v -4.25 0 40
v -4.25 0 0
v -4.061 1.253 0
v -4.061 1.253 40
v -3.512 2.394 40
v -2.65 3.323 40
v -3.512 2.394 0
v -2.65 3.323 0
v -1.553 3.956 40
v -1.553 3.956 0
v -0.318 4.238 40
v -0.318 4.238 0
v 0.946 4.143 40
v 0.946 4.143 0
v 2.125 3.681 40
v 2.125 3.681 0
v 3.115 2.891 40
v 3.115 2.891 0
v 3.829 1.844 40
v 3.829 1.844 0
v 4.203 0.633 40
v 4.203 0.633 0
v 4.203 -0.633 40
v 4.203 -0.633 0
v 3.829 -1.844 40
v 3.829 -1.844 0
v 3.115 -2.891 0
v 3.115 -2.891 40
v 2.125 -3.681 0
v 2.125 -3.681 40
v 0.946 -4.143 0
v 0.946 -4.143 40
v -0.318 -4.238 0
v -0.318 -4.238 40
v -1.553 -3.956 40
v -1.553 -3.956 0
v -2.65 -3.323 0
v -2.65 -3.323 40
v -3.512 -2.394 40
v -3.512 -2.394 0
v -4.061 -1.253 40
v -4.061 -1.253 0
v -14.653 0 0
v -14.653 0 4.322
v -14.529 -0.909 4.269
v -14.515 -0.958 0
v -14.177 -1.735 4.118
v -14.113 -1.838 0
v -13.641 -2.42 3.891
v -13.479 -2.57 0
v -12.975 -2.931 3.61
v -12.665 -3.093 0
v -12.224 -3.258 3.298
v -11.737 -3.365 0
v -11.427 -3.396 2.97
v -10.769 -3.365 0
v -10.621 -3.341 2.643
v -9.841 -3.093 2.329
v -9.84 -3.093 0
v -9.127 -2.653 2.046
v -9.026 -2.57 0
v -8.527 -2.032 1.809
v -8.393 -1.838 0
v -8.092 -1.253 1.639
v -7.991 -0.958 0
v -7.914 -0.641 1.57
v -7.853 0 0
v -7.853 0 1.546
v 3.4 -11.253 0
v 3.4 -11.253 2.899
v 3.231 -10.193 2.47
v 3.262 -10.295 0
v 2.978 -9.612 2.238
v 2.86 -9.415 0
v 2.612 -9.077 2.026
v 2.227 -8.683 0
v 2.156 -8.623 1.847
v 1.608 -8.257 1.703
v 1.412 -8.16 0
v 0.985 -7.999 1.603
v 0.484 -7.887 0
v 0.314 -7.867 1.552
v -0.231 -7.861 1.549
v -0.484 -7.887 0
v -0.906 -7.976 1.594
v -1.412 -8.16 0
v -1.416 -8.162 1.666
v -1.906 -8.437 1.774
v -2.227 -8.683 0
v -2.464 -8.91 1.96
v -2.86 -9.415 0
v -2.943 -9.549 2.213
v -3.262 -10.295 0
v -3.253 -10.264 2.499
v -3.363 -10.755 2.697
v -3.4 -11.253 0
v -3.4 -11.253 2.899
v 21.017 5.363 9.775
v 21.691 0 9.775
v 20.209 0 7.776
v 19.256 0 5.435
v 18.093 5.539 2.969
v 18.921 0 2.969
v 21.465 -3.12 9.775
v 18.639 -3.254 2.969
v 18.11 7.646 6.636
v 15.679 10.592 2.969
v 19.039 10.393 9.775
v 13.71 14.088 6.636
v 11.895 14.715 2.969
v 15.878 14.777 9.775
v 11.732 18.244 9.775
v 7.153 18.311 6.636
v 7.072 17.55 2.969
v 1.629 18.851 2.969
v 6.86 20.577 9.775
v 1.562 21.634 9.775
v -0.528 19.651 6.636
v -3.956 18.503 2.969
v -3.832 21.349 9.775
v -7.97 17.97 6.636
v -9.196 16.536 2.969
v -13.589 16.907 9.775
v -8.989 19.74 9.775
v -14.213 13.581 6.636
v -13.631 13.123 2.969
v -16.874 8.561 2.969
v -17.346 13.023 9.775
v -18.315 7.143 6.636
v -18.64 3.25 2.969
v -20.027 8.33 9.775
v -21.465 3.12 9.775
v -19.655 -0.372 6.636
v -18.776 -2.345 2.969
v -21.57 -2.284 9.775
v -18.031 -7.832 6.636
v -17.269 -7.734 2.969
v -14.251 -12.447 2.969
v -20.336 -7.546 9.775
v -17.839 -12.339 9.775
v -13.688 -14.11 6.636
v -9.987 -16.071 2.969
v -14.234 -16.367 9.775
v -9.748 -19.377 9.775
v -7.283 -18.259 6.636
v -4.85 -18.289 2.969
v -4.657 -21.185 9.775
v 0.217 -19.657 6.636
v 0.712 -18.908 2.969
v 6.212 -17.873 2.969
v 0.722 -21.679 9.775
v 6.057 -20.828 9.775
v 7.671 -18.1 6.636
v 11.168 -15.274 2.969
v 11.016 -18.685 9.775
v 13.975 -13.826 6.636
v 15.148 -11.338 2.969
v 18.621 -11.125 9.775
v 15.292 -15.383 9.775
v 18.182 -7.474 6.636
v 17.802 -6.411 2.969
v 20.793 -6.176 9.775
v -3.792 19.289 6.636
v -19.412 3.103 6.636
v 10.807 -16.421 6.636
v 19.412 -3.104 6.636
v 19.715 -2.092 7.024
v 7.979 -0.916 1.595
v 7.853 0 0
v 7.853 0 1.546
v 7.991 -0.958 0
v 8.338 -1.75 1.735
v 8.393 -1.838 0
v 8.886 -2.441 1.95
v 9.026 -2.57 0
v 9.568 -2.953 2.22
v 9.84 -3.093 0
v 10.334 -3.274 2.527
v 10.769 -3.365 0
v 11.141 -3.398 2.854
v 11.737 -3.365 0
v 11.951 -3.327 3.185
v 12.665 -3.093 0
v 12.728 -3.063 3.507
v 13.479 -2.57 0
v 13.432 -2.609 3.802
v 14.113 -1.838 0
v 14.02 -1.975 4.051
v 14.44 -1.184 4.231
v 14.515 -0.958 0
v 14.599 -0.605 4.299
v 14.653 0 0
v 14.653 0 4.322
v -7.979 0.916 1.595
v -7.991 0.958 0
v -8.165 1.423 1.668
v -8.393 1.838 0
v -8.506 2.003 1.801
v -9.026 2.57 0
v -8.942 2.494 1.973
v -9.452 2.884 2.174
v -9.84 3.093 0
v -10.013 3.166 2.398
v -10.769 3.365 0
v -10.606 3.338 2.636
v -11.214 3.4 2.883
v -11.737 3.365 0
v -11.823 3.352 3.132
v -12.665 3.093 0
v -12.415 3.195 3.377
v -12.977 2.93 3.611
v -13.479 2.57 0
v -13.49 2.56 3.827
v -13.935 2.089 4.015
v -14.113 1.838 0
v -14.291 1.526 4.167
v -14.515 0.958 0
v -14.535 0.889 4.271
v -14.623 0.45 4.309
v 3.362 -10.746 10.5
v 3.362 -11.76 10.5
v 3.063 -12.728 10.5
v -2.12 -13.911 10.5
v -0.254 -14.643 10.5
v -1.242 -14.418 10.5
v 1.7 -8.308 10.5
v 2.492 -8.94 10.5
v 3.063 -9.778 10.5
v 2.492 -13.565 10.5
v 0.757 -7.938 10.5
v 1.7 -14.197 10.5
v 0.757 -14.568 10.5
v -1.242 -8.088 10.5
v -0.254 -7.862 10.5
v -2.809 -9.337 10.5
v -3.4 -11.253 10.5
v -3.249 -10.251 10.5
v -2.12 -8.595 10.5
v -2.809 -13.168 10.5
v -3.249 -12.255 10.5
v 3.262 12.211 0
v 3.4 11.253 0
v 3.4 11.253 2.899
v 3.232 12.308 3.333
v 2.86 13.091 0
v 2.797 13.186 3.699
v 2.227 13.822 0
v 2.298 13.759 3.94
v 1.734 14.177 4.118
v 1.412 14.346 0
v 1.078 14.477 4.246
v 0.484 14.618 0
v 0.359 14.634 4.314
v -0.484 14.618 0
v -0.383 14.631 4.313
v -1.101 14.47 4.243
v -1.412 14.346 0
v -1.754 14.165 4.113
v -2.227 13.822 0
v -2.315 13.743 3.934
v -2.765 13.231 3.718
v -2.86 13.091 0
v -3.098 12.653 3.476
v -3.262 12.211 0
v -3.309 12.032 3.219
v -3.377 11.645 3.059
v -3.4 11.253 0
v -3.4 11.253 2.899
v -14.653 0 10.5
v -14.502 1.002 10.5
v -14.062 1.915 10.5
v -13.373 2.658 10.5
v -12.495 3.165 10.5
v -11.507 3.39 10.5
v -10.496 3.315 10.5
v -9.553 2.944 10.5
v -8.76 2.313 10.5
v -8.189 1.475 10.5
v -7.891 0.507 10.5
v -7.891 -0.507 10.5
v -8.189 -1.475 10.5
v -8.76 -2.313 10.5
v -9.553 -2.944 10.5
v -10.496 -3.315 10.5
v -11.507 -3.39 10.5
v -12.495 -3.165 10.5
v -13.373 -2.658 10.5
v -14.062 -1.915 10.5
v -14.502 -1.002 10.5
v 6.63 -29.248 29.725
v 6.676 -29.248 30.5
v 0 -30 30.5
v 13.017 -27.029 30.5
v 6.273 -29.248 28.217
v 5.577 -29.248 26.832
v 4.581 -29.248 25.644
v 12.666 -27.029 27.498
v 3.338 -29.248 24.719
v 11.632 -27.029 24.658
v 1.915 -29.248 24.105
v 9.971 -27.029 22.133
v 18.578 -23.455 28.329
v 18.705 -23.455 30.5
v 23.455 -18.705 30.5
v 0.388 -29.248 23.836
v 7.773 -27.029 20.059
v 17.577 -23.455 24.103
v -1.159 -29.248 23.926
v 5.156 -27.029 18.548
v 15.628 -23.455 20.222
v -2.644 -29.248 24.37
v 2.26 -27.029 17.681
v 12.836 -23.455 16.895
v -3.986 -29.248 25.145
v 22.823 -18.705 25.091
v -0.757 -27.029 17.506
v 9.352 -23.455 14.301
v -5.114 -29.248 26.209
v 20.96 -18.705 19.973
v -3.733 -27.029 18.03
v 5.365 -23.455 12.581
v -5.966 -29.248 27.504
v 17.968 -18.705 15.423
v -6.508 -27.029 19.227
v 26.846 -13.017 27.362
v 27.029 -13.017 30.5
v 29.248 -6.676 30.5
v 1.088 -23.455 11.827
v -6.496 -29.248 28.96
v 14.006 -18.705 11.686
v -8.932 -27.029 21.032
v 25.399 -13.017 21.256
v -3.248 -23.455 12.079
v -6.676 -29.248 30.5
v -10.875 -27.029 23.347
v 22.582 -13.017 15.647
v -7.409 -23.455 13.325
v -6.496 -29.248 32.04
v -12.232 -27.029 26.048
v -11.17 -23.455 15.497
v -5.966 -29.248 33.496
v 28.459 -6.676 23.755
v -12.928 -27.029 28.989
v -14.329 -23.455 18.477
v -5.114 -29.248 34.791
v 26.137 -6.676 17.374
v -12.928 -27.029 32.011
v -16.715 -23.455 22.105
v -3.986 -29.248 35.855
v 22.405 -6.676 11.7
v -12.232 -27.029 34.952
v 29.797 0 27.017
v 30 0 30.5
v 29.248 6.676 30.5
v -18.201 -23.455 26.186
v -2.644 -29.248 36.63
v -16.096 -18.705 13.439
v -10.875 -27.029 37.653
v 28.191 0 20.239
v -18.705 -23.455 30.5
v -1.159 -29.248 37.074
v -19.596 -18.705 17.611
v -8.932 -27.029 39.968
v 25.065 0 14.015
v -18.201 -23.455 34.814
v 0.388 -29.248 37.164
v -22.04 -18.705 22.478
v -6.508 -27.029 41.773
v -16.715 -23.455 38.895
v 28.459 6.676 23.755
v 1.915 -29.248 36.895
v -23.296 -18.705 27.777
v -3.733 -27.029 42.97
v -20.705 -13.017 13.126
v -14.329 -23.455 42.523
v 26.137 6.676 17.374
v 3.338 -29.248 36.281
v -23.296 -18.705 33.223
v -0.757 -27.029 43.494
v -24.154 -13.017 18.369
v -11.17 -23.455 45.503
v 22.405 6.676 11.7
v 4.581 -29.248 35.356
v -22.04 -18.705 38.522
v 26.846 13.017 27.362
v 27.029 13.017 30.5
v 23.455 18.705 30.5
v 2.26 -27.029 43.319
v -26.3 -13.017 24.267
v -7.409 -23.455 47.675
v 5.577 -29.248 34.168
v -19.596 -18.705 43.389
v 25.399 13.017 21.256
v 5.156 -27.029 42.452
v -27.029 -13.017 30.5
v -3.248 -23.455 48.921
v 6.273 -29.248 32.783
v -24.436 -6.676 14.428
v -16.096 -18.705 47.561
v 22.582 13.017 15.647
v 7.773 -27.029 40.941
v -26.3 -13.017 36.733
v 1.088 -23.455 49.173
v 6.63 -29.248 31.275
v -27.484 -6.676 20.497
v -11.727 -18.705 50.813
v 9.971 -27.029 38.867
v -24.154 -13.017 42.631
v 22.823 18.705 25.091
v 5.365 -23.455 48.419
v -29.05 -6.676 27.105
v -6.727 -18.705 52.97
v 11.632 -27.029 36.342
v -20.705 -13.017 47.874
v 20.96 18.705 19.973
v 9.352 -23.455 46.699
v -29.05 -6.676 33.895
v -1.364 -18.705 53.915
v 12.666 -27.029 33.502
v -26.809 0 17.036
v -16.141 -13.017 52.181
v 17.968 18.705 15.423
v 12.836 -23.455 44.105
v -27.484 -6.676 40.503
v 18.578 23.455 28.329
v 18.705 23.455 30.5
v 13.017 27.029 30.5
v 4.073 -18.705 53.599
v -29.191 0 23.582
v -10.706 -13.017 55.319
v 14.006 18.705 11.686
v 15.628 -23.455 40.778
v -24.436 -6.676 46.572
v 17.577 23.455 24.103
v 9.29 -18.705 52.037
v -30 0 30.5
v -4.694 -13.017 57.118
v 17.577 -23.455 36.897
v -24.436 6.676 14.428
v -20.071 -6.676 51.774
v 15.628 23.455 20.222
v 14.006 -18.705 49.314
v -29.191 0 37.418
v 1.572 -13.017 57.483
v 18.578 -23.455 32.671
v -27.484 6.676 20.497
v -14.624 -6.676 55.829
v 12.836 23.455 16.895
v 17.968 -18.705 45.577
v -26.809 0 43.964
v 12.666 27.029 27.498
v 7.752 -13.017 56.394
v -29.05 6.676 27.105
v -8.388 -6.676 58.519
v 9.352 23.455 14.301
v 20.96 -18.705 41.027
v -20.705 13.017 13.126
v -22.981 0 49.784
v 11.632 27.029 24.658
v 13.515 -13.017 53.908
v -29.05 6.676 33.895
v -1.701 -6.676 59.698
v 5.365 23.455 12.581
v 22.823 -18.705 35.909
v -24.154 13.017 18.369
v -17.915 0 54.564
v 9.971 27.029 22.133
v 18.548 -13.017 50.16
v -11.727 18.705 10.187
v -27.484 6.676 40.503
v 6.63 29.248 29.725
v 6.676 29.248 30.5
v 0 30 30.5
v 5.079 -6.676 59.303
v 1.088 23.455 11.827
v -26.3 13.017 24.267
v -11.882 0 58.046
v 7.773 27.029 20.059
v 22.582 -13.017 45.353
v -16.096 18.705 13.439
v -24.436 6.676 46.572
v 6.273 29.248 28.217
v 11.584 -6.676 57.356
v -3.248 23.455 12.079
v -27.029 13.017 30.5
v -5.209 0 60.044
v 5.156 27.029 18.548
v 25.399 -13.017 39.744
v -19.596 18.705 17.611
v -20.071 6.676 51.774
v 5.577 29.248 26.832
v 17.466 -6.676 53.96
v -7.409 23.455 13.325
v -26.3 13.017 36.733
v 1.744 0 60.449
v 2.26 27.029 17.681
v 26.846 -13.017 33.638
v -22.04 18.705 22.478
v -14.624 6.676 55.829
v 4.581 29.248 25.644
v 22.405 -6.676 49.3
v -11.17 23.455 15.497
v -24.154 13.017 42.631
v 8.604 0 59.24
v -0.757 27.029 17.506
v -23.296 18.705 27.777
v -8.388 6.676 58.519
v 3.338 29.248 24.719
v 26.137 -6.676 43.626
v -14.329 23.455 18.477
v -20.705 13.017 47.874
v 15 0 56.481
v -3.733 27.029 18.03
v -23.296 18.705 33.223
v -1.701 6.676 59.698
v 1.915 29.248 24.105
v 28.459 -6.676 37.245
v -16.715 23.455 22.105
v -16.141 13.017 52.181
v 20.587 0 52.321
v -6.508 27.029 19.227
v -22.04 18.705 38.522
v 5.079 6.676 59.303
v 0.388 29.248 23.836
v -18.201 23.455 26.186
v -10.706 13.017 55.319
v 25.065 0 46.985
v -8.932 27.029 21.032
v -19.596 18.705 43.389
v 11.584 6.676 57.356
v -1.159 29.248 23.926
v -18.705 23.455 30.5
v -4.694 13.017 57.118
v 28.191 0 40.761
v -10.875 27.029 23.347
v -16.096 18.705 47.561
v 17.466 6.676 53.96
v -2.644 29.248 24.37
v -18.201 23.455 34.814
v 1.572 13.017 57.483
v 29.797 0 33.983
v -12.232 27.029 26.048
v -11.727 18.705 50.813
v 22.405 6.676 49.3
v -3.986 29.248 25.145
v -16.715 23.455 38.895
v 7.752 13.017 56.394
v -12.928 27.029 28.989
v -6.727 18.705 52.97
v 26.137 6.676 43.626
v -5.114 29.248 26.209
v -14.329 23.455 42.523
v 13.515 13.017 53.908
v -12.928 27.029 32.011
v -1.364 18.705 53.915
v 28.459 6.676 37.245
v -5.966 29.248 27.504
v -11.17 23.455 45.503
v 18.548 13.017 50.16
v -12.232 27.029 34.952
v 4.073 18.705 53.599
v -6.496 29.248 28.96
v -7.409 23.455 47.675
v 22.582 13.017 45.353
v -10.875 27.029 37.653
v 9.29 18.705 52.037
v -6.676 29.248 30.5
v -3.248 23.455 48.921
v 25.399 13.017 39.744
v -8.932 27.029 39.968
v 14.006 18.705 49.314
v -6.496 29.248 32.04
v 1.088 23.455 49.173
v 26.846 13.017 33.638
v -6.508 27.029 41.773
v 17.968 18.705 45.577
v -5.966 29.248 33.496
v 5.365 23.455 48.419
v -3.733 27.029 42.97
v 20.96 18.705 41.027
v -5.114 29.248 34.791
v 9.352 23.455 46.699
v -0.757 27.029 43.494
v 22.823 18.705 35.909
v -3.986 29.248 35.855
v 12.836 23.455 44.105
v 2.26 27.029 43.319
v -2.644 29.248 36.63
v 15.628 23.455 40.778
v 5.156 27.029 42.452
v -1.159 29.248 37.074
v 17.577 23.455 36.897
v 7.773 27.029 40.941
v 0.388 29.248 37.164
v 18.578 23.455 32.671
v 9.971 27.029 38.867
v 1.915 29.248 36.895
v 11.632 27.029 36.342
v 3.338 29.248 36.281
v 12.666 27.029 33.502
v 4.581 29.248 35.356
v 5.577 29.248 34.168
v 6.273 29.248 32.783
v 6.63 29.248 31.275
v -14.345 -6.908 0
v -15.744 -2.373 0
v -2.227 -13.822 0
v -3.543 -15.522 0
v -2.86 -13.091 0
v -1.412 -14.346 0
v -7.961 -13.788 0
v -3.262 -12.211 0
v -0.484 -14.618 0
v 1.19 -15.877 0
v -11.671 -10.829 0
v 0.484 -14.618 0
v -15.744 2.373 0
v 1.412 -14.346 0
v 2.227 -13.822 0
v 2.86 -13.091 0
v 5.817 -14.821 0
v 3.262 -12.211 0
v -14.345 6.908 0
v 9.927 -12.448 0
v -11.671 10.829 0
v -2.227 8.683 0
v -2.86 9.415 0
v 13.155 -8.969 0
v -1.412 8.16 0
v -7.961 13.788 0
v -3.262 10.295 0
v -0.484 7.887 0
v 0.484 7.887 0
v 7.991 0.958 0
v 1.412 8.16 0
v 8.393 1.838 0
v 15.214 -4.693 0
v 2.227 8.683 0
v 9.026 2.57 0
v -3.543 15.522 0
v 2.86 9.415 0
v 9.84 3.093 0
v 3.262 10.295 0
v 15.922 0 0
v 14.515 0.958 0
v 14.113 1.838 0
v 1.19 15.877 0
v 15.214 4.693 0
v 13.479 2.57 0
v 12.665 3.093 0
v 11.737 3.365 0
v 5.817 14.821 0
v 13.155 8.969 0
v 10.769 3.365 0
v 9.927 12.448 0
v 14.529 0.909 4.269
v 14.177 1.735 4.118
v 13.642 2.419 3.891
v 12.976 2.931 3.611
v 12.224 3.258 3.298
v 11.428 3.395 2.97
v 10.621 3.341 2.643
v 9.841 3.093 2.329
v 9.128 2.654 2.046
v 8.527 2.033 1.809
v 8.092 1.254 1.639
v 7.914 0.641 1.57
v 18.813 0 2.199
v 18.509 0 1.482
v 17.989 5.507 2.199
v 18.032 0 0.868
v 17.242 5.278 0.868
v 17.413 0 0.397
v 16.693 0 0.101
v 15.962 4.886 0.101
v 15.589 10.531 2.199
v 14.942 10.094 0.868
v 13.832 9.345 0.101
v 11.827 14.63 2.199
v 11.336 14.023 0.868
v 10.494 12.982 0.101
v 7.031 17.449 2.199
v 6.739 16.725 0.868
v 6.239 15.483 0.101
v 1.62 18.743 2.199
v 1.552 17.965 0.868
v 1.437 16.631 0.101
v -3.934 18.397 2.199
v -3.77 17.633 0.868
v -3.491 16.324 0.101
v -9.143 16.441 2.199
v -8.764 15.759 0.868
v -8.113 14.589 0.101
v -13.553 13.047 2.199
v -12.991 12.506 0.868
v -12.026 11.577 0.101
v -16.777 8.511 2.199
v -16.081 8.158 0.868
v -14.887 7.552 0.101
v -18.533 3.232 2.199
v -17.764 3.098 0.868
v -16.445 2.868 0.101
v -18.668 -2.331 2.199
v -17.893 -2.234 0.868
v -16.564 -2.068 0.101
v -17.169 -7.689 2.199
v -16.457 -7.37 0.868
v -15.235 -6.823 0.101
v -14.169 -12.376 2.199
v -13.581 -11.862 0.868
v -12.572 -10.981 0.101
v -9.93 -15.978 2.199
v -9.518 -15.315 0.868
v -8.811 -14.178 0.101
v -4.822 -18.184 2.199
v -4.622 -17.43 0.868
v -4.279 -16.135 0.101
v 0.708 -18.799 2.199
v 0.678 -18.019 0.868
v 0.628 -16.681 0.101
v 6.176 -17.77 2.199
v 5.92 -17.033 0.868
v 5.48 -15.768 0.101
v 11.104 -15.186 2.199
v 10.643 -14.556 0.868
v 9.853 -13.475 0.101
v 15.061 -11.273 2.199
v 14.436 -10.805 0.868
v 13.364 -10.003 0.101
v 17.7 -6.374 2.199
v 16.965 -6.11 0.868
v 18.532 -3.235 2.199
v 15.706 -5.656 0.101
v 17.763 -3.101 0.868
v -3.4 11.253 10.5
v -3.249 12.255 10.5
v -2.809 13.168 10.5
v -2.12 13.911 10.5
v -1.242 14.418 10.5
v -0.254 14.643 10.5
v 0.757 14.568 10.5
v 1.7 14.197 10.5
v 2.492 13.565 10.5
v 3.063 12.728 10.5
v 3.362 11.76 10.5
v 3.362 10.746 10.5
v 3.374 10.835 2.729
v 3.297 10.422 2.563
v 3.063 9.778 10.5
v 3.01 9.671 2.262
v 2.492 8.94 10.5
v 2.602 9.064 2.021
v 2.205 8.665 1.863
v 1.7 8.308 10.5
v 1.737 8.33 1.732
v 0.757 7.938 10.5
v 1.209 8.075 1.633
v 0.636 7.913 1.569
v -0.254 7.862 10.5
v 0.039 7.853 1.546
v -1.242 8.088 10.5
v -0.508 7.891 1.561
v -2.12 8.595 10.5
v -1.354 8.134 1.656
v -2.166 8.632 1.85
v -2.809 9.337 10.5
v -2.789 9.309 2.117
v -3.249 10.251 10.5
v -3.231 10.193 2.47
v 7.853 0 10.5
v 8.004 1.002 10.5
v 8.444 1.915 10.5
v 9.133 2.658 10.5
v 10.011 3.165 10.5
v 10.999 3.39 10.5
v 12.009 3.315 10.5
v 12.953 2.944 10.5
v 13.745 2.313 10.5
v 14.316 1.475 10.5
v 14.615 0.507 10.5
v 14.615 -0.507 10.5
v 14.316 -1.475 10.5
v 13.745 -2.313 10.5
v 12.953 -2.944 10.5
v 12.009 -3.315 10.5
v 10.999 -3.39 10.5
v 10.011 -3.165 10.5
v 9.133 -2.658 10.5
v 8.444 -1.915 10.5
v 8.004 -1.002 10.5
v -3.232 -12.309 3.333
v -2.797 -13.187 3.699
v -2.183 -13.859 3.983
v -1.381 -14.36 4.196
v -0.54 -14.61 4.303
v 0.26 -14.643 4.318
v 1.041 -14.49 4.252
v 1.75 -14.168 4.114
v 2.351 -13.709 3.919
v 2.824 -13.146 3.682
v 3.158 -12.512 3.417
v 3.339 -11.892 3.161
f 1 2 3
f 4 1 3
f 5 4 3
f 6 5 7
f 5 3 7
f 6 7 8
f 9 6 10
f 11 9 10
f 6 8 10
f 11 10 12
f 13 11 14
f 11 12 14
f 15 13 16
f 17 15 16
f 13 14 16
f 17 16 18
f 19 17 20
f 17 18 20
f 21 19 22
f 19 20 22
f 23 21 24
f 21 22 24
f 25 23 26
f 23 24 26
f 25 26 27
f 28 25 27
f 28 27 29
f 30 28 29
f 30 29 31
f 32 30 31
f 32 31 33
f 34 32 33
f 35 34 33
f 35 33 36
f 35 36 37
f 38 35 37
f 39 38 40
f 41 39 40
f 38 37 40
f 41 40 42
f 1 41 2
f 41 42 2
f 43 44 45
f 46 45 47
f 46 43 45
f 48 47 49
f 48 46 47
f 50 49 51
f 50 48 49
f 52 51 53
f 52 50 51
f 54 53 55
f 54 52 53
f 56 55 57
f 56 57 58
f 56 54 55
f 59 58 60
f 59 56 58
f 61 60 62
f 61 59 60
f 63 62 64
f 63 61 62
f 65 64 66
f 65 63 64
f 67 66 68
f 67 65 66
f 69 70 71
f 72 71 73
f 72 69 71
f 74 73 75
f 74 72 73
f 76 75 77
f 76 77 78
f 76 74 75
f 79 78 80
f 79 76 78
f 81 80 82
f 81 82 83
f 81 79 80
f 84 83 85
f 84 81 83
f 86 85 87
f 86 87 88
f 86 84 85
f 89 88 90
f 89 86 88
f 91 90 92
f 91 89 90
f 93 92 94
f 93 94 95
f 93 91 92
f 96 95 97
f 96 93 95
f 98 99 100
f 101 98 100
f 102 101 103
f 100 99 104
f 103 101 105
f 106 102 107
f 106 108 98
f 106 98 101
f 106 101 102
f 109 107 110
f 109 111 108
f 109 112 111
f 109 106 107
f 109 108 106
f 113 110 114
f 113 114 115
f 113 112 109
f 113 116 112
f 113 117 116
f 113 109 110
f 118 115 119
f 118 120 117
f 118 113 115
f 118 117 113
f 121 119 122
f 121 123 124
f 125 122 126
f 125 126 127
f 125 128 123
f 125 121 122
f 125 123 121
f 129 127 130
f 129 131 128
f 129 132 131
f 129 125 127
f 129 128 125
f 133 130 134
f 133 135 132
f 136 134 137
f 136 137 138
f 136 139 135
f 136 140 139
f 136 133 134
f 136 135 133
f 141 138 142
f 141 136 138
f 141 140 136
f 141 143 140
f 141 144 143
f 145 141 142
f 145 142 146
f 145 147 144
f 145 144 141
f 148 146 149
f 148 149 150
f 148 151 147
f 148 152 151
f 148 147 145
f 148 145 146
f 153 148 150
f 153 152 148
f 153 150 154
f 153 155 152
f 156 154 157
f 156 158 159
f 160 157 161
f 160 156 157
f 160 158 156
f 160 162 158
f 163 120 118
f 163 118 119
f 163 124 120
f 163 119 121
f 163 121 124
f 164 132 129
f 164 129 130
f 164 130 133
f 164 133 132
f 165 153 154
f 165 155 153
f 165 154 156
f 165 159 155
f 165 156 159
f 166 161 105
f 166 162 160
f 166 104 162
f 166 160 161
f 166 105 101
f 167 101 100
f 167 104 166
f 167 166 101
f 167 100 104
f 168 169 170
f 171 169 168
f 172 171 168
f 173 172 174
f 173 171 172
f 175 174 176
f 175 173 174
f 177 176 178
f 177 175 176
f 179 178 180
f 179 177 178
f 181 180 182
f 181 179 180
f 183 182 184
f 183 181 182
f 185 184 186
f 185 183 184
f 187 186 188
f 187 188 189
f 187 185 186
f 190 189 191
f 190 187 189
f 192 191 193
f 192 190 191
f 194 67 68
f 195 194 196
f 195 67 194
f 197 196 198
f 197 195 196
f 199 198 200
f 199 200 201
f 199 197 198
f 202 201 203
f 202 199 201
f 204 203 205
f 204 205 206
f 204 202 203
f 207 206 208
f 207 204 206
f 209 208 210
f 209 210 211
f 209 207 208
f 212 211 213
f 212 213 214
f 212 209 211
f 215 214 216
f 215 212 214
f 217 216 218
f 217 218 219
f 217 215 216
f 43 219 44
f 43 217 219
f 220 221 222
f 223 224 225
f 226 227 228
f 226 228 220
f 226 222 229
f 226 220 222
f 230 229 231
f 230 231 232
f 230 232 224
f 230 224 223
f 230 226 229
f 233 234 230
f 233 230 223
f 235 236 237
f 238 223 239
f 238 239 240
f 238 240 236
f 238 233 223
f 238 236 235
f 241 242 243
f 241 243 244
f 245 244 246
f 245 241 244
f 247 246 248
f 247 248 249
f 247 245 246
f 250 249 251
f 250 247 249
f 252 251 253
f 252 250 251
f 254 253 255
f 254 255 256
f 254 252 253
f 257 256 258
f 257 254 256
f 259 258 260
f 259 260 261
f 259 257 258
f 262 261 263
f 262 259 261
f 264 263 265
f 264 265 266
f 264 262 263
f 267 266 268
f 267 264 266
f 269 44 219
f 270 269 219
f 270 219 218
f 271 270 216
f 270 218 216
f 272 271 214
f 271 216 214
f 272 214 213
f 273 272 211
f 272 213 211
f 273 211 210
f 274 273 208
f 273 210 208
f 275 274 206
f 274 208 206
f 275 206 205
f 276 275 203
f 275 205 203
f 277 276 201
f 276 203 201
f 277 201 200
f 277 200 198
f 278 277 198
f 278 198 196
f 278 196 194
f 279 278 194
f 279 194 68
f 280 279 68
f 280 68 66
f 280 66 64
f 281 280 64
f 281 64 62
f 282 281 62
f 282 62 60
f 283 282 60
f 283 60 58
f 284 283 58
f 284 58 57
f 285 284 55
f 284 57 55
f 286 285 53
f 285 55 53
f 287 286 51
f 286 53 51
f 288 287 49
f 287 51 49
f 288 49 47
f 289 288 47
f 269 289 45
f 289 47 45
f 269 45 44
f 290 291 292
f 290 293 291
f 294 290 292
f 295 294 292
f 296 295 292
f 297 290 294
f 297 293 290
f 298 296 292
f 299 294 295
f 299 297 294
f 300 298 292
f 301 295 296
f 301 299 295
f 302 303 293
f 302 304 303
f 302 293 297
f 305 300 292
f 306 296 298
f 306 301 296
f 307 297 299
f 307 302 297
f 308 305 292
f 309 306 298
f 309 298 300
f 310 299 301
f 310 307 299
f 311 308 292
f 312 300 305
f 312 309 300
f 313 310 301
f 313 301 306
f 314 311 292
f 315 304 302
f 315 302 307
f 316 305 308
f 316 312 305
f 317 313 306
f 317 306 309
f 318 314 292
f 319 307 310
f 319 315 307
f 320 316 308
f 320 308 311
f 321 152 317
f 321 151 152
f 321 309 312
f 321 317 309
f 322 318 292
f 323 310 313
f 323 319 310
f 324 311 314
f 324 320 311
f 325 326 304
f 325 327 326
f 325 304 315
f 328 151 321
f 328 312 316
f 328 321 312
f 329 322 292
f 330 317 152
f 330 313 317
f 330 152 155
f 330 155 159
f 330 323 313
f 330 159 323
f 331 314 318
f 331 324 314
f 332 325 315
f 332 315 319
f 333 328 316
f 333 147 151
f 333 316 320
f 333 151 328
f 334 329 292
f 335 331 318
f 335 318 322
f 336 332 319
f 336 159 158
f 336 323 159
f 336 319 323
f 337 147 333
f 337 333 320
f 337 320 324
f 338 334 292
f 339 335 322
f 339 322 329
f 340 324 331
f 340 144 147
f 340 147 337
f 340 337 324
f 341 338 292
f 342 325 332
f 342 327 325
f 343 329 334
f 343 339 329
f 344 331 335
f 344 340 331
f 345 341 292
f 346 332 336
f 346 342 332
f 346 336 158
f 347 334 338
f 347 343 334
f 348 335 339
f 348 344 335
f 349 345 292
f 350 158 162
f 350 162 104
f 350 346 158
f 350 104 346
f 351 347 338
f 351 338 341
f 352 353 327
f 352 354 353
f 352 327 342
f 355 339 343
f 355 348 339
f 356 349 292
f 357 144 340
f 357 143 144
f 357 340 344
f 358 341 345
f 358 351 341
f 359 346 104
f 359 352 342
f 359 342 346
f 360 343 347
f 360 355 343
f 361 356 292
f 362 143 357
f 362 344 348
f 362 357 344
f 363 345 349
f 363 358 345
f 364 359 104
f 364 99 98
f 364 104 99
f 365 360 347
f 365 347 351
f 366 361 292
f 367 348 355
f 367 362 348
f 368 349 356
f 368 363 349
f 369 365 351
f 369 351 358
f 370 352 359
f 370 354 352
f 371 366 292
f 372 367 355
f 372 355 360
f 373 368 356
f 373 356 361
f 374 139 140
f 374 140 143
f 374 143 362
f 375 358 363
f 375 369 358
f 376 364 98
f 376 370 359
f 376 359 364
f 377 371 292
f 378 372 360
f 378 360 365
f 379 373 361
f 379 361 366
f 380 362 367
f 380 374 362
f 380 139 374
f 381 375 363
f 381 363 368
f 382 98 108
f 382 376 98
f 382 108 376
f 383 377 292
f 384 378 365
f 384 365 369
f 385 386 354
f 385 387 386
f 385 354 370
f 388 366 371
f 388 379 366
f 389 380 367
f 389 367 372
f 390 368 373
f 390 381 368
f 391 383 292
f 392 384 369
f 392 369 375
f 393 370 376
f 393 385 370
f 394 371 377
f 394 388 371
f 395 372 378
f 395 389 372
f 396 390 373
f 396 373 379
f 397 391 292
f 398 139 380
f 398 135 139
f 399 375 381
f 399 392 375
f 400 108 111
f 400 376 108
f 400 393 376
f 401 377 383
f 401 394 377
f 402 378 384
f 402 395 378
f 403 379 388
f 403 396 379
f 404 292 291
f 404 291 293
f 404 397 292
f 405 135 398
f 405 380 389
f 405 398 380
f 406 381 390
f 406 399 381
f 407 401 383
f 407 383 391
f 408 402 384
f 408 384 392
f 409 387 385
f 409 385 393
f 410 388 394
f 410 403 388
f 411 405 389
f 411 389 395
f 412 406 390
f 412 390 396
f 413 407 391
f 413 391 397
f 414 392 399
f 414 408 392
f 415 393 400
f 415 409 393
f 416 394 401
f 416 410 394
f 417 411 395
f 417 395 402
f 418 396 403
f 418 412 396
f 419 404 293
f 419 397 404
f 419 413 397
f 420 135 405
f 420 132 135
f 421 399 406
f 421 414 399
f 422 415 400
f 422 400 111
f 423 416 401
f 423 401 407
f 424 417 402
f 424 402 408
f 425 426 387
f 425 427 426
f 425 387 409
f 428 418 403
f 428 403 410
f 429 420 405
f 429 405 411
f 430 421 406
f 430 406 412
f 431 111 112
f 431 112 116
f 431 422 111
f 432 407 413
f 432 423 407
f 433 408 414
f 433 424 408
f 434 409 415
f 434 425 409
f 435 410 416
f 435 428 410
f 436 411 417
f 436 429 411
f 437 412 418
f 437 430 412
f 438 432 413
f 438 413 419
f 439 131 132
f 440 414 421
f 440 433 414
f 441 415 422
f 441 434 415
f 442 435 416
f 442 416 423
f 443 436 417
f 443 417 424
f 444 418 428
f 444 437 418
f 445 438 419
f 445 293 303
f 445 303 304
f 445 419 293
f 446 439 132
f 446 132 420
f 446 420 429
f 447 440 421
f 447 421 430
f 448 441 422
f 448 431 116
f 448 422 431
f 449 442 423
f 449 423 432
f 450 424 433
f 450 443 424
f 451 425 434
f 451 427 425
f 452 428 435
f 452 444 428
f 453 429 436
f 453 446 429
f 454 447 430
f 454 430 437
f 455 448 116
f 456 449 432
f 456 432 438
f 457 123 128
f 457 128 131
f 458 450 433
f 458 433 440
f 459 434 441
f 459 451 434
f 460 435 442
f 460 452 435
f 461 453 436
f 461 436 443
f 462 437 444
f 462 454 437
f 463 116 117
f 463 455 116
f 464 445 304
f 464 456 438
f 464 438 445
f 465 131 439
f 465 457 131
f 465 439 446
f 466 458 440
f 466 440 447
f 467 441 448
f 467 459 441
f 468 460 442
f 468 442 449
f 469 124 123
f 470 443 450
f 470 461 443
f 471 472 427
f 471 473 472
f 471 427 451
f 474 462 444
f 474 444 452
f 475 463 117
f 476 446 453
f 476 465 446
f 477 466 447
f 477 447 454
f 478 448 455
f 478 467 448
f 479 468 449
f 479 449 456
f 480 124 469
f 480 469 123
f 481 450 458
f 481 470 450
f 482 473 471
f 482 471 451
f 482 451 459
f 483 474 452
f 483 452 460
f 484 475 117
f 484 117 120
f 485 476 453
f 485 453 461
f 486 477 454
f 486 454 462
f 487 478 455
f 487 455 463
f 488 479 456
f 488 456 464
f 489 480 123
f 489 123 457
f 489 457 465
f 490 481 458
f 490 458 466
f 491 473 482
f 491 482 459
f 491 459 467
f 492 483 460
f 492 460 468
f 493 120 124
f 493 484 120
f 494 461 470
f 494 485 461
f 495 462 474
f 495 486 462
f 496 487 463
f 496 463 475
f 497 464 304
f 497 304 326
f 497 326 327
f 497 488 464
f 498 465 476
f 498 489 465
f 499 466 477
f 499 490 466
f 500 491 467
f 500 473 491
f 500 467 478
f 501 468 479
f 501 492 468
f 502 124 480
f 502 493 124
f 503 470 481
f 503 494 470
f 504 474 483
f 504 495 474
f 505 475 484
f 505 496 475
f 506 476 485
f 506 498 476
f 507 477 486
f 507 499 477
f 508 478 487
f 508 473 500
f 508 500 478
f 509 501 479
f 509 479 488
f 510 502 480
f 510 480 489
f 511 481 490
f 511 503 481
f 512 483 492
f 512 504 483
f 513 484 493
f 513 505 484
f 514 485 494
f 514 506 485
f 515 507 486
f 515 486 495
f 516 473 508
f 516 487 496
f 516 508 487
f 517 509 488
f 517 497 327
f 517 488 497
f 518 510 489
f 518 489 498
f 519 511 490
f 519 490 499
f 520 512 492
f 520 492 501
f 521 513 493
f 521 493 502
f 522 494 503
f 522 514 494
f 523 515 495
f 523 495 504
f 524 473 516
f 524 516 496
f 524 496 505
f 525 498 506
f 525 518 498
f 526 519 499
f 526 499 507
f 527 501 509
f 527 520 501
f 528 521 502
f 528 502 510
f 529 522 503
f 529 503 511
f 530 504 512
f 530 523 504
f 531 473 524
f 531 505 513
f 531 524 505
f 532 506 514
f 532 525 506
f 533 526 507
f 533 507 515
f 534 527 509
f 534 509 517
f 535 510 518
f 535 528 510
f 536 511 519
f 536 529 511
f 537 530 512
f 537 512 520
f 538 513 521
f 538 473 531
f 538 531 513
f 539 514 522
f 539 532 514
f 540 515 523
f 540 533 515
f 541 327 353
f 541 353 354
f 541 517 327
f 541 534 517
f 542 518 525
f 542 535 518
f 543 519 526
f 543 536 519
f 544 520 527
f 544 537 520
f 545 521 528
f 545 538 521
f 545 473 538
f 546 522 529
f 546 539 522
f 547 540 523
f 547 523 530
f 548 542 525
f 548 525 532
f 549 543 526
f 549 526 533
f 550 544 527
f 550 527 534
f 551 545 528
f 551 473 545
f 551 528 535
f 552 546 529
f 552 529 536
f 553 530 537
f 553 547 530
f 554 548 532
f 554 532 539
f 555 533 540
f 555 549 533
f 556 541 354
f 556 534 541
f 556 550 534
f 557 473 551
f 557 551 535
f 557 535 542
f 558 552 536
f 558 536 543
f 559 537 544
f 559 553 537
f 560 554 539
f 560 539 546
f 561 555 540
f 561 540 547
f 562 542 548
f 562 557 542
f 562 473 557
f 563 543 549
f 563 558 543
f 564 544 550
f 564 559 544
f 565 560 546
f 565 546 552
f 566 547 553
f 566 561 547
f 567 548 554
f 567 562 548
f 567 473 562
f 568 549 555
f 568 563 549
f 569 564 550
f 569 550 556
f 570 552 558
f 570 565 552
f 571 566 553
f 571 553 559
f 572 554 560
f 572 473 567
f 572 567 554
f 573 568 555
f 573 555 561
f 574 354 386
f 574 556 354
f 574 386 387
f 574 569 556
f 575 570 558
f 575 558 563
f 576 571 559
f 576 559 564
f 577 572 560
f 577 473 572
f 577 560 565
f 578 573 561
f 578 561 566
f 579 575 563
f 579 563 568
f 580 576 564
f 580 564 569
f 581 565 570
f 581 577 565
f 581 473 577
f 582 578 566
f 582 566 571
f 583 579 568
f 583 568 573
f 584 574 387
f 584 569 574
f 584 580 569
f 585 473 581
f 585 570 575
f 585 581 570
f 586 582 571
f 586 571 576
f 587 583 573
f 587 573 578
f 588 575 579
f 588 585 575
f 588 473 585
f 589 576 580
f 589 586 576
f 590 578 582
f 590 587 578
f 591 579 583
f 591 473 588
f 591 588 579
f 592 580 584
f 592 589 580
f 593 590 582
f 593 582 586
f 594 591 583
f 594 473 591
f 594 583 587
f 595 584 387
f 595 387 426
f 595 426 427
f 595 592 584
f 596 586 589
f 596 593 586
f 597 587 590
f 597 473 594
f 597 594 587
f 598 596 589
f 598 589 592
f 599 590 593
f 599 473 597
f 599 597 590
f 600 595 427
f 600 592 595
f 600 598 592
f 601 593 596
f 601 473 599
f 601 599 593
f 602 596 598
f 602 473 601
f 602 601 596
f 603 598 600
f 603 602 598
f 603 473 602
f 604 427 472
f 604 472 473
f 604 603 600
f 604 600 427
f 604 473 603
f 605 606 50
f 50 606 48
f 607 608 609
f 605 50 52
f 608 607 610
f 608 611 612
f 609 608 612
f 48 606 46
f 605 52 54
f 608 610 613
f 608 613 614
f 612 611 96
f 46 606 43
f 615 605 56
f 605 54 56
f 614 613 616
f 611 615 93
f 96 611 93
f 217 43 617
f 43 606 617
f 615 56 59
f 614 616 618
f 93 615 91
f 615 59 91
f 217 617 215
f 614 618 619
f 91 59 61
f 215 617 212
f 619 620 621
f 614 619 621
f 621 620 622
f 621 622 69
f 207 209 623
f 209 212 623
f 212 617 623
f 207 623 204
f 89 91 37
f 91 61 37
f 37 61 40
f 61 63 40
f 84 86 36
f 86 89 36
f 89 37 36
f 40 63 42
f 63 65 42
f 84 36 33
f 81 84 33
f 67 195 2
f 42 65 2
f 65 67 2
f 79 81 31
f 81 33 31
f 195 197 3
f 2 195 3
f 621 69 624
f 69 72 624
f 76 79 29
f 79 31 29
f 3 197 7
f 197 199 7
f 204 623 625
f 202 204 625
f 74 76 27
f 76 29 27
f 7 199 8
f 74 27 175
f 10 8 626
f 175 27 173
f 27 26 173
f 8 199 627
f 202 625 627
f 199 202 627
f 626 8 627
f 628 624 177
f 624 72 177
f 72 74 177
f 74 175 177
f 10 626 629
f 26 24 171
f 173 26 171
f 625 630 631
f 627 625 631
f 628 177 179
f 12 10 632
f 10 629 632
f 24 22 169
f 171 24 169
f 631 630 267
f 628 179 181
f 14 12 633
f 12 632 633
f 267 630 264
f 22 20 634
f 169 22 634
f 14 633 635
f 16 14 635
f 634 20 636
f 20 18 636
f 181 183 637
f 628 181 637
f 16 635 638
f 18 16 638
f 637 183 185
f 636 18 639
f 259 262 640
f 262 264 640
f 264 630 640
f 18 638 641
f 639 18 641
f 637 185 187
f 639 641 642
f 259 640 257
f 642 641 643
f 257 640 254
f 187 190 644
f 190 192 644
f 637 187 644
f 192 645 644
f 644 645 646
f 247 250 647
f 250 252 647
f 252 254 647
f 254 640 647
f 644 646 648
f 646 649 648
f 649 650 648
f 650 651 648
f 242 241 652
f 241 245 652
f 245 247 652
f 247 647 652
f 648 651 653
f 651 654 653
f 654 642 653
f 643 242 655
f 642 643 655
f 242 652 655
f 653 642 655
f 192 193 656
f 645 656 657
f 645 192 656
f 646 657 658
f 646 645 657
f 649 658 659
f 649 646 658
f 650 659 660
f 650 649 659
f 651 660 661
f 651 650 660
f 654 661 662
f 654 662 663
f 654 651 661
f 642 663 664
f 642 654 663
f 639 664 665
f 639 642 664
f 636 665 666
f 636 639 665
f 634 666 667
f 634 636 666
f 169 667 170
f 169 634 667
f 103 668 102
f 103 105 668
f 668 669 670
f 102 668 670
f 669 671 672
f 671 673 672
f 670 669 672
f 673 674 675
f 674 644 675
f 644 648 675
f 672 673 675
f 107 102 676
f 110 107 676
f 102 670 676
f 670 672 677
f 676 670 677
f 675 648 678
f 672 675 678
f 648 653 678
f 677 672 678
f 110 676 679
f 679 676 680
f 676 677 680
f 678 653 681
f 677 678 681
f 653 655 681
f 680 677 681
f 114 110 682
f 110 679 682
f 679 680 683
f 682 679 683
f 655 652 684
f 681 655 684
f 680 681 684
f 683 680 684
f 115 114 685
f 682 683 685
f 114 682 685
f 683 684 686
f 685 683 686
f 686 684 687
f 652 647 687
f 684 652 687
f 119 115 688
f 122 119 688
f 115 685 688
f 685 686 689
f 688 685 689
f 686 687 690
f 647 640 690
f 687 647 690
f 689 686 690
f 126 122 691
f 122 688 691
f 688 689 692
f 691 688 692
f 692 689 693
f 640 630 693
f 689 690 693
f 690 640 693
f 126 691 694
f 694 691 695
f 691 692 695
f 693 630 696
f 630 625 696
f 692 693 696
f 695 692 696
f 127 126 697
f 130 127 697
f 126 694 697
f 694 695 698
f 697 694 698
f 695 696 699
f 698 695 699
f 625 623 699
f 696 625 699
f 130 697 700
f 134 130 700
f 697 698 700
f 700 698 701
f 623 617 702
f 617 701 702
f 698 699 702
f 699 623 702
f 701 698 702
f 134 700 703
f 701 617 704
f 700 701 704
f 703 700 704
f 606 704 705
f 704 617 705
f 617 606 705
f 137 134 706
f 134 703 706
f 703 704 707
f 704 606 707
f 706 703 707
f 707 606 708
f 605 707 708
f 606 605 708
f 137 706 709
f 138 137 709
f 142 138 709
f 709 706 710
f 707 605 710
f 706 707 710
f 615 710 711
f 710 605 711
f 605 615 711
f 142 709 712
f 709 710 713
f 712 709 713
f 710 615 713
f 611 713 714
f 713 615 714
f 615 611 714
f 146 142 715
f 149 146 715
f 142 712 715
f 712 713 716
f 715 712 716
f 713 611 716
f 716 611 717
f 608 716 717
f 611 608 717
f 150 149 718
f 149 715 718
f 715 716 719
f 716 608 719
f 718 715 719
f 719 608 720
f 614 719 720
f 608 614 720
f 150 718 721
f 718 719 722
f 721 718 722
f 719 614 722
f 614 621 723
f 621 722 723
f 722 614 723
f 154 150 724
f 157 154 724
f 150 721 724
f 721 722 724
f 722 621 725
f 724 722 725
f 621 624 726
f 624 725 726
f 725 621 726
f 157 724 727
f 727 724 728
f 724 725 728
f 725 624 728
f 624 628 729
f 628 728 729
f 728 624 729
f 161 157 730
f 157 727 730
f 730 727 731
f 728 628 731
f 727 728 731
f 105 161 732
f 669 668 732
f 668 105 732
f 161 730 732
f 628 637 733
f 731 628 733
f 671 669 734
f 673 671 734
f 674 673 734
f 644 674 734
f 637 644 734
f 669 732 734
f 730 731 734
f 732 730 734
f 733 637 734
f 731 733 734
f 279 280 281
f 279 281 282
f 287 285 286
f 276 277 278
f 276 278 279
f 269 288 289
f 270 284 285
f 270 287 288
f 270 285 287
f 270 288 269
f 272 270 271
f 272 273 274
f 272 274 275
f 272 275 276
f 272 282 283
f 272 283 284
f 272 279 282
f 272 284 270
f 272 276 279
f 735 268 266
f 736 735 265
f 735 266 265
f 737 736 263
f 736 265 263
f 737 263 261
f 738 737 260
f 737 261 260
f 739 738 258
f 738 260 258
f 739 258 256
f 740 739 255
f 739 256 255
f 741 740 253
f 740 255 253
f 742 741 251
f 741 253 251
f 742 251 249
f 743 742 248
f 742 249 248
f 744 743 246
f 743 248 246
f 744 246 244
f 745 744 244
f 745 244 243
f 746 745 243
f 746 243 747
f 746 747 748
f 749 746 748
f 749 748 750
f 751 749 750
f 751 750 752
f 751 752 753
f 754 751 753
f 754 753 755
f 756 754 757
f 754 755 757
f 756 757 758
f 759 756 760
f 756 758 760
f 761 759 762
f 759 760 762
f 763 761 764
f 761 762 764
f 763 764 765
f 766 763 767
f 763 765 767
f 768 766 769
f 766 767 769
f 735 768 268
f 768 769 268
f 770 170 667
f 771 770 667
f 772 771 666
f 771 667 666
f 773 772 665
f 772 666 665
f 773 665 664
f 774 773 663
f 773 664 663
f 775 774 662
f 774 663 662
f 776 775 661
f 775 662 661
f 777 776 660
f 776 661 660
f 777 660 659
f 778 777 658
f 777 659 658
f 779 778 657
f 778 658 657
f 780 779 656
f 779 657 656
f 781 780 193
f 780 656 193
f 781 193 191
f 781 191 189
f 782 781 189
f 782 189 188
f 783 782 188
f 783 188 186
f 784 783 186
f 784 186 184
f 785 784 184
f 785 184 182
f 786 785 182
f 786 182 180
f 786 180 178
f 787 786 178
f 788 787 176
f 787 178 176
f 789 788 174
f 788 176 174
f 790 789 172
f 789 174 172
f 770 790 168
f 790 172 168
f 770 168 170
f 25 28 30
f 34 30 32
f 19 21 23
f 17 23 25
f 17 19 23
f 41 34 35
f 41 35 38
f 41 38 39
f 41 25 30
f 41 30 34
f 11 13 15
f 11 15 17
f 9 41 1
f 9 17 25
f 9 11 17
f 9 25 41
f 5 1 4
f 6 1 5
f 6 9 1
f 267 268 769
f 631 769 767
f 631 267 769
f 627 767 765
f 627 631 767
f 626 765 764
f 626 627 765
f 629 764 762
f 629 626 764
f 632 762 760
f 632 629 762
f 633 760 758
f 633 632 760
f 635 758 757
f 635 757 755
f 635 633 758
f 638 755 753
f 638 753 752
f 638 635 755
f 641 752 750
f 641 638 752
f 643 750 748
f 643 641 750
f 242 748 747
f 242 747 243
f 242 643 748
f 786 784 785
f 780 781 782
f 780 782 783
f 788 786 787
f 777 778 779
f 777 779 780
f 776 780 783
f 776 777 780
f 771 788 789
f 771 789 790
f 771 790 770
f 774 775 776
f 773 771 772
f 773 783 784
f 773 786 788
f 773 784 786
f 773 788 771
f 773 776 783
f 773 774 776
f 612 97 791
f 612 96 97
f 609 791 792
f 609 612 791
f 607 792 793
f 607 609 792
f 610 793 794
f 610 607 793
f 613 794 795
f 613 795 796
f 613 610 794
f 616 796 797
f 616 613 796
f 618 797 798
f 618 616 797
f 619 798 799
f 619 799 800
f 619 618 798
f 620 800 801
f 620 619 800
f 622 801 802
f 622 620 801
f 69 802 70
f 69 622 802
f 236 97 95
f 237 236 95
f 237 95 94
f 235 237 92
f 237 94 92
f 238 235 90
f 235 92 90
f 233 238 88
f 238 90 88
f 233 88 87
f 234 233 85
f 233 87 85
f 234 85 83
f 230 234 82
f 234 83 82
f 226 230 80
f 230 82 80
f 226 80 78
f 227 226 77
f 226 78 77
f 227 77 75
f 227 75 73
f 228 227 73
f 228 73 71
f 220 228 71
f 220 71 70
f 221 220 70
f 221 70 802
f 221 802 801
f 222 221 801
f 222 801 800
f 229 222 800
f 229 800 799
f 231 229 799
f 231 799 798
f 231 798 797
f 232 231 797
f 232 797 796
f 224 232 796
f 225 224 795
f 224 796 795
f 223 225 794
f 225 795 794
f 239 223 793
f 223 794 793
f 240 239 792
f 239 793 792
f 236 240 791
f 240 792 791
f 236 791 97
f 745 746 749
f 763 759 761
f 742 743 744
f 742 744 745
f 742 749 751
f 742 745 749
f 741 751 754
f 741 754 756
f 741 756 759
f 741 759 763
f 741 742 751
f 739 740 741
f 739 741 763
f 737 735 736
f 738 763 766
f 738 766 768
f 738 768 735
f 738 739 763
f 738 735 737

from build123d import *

# Parameters (mm, degrees)
SKETCH2_R           = 18.921523051
SKETCH2_R_2         = 3.4
BOSS_EXTRUDE1_DEPTH = 10
FILLET1_R           = 3
SKETCH3_R           = 18.921523051
SKETCH3_R_2         = 3.4
BOSS_EXTRUDE2_DEPTH = 0.5
SKETCH4_R           = 18.921523051
BOSS_EXTRUDE3_DEPTH = 5
SKETCH8_R           = 18.921523051
BOSS_EXTRUDE4_DEPTH = 15
SKETCH10_R          = 4.25
CUT_EXTRUDE2_DEPTH  = 40
FILLET2_R           = 10
SKETCH11_R          = 3.4
CUT_EXTRUDE3_DEPTH  = 10.5


with BuildPart() as part:
    # Sketch2 → Boss-Extrude1 (new body)
    with BuildSketch(Plane.XY):
        Circle(SKETCH2_R)
        with Locations((0, 11.25277675)):
            Circle(SKETCH2_R_2, mode=Mode.SUBTRACT)
        with Locations((11.25277675, 0)):
            Circle(SKETCH2_R_2, mode=Mode.SUBTRACT)
        with Locations((0, -11.25277675)):
            Circle(SKETCH2_R_2, mode=Mode.SUBTRACT)
        with Locations((-11.25277675, 0)):
            Circle(SKETCH2_R_2, mode=Mode.SUBTRACT)
    extrude(amount=BOSS_EXTRUDE1_DEPTH)

    # Fillet1
    fillet1_edges = [part.edges().sort_by_distance(p)[0] for p in [
        (-18.921523051, 0, 0),
    ]]
    fillet(fillet1_edges, radius=FILLET1_R)

    # Sketch3 → Boss-Extrude2 (add)
    with BuildSketch(Plane.XY.offset(10)):
        Circle(SKETCH3_R)
        with Locations((0, 11.25277675)):
            Circle(SKETCH3_R_2, mode=Mode.SUBTRACT)
        with Locations((11.25277675, 0)):
            Circle(SKETCH3_R_2, mode=Mode.SUBTRACT)
        with Locations((-11.25277675, 0)):
            Circle(SKETCH3_R_2, mode=Mode.SUBTRACT)
        with Locations((0, -11.25277675)):
            Circle(SKETCH3_R_2, mode=Mode.SUBTRACT)
    extrude(amount=BOSS_EXTRUDE2_DEPTH)

    # Sketch4 → Boss-Extrude3 (add)
    with BuildSketch(Plane.XY.offset(10.5)):
        Circle(SKETCH4_R)
    extrude(amount=BOSS_EXTRUDE3_DEPTH)

    # Sketch8 → Boss-Extrude4 (add)
    with BuildSketch(Plane.XY.offset(15.5)):
        Circle(SKETCH8_R)
    extrude(amount=BOSS_EXTRUDE4_DEPTH)

    # Sketch9 → Revolve2 (revolve)
    with BuildSketch(Plane.XY.offset(30.5)):
        with BuildLine():
            ThreePointArc((0, -30), (30, 0), (0, 30))
            Line((0, 30), (0, -30))
        make_face()
    revolve(axis=Axis((0, 0, 30.5), (0, 1, 0)))

    # Sketch10 → Cut-Extrude2 (cut)
    with BuildSketch(Plane(origin=(0, 0, 0), x_dir=(-1, 0, 0), z_dir=(0, 0, -1))):
        Circle(SKETCH10_R)
    extrude(amount=-CUT_EXTRUDE2_DEPTH, mode=Mode.SUBTRACT)

    # Fillet2
    fillet2_edges = [part.edges().sort_by_distance(p)[0] for p in [
        (-18.921523048, 0, 7.219622739),
    ]]
    fillet(fillet2_edges, radius=FILLET2_R)

    # Sketch11 → Cut-Extrude3 (cut)
    with BuildSketch(Plane(origin=(0, 0, 0), x_dir=(-1, 0, 0), z_dir=(0, 0, -1))):
        with Locations((0, -11.25277675)):
            Circle(SKETCH11_R)
        with Locations((-11.25277675, 0)):
            Circle(SKETCH11_R)
        with Locations((0, 11.25277675)):
            Circle(SKETCH11_R)
        with Locations((11.25277675, 0)):
            Circle(SKETCH11_R)
    extrude(amount=-CUT_EXTRUDE3_DEPTH, mode=Mode.SUBTRACT)


solid = part.part
